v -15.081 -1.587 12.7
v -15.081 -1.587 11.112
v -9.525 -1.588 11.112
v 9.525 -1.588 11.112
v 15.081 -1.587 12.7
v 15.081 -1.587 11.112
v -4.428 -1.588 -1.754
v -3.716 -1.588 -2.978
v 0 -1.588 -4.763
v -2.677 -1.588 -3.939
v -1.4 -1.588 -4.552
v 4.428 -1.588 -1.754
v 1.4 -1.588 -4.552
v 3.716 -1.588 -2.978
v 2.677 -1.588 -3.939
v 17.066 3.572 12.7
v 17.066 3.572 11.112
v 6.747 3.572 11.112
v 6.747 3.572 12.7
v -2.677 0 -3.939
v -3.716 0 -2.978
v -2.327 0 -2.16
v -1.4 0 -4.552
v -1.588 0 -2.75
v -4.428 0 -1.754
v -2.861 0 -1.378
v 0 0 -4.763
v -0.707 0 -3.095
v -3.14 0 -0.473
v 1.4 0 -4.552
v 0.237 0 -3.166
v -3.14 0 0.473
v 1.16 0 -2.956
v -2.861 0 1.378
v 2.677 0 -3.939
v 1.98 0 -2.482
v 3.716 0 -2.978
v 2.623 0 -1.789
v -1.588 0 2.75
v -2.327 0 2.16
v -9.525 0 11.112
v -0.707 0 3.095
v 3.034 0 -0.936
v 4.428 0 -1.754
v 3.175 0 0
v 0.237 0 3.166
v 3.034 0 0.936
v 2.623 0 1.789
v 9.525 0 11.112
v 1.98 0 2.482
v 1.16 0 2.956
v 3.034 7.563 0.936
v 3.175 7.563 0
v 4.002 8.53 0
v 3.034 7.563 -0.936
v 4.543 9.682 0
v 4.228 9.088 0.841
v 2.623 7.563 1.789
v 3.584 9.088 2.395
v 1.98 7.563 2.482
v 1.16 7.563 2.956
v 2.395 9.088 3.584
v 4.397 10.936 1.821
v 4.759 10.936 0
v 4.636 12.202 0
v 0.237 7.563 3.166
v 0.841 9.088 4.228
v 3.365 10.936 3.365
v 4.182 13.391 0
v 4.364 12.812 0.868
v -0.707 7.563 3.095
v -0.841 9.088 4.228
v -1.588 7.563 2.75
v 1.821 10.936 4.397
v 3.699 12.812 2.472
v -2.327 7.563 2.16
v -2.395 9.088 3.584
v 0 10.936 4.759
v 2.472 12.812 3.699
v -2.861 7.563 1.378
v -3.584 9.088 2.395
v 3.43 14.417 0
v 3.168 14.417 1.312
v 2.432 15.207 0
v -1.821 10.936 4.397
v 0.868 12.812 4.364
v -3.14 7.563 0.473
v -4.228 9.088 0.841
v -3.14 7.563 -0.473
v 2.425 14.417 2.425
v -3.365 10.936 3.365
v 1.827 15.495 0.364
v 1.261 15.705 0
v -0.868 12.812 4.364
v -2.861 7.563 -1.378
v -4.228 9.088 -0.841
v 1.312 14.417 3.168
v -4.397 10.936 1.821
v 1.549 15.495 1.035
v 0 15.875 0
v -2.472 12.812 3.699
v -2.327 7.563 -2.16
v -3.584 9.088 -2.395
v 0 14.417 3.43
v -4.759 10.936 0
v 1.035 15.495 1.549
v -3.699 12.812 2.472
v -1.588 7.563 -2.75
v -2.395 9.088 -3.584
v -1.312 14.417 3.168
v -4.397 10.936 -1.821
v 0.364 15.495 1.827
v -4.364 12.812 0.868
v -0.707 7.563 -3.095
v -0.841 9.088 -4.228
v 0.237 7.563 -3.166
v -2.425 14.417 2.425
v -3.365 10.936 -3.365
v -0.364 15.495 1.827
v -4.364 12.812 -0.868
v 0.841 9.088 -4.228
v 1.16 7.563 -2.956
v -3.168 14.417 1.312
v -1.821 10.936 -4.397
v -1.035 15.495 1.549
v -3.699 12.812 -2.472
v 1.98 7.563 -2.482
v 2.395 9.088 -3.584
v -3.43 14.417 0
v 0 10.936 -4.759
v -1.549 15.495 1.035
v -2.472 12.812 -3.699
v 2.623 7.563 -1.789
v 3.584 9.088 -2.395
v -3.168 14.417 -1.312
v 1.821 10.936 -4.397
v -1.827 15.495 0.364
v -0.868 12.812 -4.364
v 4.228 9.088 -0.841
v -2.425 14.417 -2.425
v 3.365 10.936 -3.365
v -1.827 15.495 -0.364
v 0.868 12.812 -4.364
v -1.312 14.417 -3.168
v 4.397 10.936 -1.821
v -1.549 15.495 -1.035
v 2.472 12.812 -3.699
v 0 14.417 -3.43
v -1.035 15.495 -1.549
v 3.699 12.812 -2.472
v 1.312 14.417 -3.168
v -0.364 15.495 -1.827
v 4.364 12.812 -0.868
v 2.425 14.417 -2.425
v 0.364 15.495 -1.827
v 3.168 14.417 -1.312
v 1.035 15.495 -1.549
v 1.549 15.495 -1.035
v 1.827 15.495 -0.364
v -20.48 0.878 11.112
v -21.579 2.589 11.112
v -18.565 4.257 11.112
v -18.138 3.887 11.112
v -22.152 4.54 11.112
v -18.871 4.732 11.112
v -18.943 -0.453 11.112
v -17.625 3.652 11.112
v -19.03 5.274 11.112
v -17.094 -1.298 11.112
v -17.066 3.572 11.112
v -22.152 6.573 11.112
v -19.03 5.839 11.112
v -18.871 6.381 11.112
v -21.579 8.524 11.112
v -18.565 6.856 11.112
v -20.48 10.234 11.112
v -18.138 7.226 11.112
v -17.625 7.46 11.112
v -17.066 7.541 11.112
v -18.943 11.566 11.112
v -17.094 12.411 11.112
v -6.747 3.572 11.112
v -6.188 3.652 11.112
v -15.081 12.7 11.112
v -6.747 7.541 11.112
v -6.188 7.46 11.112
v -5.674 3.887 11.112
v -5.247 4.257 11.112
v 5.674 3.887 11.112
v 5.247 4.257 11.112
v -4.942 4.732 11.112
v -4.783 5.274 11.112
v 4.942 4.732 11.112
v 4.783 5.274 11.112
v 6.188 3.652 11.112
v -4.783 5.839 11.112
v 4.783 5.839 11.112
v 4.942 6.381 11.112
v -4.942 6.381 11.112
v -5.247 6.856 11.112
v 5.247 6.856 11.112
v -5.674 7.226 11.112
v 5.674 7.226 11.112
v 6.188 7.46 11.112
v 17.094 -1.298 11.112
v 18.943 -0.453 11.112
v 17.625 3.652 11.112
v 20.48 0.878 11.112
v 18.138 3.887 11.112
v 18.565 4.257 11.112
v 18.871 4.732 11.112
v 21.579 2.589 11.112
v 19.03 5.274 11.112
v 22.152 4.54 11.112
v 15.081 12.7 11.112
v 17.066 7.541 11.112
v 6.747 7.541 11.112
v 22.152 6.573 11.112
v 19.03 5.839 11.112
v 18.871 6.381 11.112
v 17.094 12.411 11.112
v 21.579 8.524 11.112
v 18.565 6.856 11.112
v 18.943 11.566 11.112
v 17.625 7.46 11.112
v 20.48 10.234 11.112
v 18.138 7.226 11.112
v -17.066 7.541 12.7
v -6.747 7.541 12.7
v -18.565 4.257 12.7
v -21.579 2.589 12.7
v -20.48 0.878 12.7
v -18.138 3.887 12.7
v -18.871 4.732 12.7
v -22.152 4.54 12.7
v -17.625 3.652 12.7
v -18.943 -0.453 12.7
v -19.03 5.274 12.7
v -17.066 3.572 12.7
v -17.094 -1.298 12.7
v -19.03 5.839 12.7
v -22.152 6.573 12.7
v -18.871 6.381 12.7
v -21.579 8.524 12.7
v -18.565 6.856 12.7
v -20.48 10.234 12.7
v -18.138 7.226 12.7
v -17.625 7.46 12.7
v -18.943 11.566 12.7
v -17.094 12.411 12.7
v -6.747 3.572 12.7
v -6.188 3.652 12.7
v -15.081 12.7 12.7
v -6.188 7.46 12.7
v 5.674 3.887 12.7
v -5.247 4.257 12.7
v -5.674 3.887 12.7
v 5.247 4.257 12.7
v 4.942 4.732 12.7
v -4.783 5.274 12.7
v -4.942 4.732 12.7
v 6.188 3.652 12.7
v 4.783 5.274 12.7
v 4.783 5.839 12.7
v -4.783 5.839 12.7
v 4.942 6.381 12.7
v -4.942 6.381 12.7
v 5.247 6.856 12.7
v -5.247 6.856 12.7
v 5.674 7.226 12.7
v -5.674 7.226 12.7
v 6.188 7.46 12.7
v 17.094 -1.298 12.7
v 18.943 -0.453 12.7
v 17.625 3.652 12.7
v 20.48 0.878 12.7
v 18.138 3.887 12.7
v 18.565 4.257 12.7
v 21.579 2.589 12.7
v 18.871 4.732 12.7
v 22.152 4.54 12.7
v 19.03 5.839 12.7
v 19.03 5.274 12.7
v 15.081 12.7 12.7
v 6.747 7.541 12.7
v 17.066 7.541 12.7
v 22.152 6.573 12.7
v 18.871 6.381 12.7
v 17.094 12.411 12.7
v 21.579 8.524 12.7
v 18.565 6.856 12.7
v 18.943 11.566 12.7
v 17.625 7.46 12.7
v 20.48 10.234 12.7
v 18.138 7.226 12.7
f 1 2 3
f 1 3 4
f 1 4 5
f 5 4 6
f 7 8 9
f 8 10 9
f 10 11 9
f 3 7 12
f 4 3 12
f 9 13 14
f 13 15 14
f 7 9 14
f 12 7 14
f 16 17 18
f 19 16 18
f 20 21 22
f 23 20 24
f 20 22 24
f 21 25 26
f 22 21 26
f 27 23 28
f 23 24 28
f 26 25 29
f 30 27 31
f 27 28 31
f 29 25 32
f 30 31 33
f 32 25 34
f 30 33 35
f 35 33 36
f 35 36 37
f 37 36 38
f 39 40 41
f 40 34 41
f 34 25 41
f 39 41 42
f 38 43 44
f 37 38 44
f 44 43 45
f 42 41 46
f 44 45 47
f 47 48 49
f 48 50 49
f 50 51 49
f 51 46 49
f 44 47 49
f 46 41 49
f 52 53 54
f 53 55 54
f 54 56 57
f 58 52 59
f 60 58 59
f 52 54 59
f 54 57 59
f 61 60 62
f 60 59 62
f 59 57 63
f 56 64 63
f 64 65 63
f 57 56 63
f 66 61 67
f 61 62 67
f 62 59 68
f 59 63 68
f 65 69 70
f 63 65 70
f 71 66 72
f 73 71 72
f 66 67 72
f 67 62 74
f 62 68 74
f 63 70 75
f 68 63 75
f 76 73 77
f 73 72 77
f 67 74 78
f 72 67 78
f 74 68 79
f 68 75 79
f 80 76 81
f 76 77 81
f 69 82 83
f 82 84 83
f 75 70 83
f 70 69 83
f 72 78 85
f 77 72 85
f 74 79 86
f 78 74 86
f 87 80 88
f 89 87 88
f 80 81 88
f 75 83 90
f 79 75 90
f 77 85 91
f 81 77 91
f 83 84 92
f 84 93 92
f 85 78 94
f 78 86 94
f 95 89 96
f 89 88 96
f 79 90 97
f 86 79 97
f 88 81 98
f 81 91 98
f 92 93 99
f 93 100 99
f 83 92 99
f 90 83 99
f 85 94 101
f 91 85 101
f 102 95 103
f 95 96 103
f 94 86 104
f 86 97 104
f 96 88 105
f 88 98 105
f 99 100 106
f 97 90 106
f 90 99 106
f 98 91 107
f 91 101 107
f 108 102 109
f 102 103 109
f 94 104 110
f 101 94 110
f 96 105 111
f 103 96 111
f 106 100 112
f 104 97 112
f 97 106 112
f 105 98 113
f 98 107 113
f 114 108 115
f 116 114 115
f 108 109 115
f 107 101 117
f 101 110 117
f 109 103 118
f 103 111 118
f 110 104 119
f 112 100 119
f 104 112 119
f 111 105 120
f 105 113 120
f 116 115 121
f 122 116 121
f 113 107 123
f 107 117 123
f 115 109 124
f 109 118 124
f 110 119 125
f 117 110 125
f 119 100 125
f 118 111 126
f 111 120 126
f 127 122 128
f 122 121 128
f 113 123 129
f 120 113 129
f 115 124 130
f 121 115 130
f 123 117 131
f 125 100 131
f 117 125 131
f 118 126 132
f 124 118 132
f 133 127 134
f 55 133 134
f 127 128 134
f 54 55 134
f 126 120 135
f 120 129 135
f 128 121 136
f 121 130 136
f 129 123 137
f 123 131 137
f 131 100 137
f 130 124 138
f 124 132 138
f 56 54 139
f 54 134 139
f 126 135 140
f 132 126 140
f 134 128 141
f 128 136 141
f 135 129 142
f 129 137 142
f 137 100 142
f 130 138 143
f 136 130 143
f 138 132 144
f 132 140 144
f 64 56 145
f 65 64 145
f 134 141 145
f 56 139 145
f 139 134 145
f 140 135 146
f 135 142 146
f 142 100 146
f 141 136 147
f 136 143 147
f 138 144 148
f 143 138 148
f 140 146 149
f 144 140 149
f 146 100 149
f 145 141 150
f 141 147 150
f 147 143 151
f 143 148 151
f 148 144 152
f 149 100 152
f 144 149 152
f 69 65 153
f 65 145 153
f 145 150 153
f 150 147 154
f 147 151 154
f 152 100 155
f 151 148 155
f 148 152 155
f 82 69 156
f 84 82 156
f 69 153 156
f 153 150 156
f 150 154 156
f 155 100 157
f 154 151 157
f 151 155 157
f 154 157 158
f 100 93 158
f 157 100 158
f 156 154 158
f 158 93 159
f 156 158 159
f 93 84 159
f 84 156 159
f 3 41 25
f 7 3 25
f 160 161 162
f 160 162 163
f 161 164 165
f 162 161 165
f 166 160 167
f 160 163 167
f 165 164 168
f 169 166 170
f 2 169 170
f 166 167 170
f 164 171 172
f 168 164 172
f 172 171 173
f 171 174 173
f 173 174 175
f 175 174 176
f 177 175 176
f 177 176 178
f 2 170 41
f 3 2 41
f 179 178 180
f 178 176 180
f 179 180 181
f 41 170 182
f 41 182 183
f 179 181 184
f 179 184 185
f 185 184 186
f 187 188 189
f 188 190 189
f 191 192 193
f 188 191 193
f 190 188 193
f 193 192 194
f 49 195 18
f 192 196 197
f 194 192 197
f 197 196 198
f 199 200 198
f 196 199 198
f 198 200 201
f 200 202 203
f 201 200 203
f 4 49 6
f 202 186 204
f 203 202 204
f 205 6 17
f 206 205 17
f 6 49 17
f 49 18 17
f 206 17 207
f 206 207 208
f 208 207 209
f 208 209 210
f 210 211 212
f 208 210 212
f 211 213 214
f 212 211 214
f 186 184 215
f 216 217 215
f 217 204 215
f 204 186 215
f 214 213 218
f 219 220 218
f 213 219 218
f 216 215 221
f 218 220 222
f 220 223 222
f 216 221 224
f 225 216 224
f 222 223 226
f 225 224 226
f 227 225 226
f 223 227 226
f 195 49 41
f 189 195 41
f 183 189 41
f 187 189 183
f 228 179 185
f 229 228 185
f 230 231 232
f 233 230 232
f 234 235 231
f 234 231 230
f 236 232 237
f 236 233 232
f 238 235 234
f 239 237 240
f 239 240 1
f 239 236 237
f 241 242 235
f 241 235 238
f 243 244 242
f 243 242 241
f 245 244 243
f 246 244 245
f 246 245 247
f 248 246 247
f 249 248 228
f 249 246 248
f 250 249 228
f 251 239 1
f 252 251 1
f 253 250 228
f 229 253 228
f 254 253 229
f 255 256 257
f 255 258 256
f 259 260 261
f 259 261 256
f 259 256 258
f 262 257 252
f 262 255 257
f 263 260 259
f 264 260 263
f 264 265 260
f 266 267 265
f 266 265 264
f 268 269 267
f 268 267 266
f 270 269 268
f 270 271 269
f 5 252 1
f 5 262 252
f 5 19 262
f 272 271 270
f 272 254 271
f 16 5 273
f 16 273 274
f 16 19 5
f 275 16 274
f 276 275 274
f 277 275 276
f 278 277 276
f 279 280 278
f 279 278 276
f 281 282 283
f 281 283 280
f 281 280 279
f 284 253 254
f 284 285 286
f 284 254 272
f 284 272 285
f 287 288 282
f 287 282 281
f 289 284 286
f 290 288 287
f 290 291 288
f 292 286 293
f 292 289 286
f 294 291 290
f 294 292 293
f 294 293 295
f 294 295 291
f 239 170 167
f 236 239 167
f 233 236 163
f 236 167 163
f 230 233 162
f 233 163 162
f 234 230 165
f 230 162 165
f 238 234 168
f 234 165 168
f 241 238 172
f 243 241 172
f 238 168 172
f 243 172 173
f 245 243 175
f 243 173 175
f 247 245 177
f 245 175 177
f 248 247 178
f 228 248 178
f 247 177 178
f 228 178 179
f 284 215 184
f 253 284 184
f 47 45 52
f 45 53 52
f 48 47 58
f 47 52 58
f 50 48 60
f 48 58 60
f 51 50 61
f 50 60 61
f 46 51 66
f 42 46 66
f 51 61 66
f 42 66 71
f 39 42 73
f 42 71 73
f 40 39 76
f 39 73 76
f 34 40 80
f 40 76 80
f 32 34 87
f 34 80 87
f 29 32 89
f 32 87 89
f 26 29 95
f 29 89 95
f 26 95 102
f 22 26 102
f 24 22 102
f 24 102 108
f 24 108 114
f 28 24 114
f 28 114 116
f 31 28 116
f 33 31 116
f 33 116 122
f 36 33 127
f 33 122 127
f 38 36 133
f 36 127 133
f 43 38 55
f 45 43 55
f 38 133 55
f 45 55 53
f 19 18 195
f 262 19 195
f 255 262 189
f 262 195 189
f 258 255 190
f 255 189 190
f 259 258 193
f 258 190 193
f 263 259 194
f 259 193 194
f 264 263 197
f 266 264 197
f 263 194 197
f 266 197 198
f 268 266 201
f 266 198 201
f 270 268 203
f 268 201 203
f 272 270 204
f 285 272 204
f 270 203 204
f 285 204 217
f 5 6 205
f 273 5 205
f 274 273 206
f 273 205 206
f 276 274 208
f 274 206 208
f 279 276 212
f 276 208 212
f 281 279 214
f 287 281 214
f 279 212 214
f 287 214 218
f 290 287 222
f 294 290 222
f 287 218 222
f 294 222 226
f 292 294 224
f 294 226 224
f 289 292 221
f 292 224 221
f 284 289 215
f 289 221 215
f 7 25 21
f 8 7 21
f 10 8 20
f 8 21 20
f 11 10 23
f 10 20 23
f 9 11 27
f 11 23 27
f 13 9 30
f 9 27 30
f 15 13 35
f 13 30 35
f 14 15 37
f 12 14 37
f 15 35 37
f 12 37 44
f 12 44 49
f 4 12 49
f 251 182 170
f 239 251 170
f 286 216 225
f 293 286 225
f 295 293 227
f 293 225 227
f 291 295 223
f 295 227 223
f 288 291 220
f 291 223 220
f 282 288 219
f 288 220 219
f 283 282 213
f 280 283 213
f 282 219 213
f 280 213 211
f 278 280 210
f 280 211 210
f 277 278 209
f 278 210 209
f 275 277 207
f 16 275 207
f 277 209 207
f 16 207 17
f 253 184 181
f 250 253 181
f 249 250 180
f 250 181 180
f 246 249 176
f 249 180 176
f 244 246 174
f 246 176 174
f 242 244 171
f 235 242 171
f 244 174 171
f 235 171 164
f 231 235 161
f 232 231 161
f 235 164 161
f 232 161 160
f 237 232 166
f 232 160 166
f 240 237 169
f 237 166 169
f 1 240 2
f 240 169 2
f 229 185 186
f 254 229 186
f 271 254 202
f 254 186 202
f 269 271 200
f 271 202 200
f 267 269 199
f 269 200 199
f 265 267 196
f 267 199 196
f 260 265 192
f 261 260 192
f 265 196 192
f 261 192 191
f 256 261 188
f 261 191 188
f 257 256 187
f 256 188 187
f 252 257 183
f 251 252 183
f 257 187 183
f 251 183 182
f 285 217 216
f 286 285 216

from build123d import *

# Parameters (mm, degrees)
F1_DEPTH = 1.5875
F4_W     = 19.05
F4_H     = 1.5875
F5_DEPTH = 1.5875


with BuildPart() as f1:
    # F0 (on Front) → F1 (new body)
    with BuildSketch(Plane.XZ):
        with BuildLine():
            ThreePointArc((4.4277010242, -1.7541008779), (4.6780515377, -0.8928830052), (4.7625, 0))
            ThreePointArc((4.7625, 0), (-0.8928830052, 4.6780515377), (-4.4277010242, -1.7541008779))
            ThreePointArc((-4.4277010242, -1.7541008779), (0, -4.7625), (4.4277010242, -1.7541008779))
        make_face()
        with BuildLine():
            ThreePointArc((-4.4277010242, -1.7541008779), (-0.8928830052, 4.6780515377), (4.7625, 0))
            ThreePointArc((4.7625, 0), (4.6780515377, -0.8928830052), (4.4277010242, -1.7541008779))
            Line((4.4277010242, -1.7541008779), (9.525, 11.1125))
            Line((9.525, 11.1125), (-9.525, 11.1125))
            Line((-9.525, 11.1125), (-4.4277010242, -1.7541008779))
        make_face()
    extrude(amount=F1_DEPTH)

    # F2 (on Top) → F3 (revolve)
    with BuildSketch(Plane.XY):
        with BuildLine():
            Line((0, 0), (3.175, 0))
            Line((3.175, 0), (3.175, 7.5627420857))
            ThreePointArc((3.175, 7.5627420857), (1.6993652025, 6.6635041404), (0, 6.35))
            Line((0, 6.35), (0, 0))
        make_face()
        with BuildLine():
            ThreePointArc((0, 6.35), (1.6993652025, 6.6635041404), (3.175, 7.5627420857))
            ThreePointArc((3.175, 7.5627420857), (4.4489958596, 12.8118652025), (0, 15.875))
            Line((0, 15.875), (0, 11.1125))
            Line((0, 11.1125), (0, 6.35))
        make_face()
    revolve(axis=Axis((0, 5.55625, 0), (0, -1, 0)))

    # F4 (on face) → F5 (join)
    with BuildSketch(Plane.XY.offset(11.1125)):
        with BuildLine():
            Line((9.525, -1.5875), (15.08125, -1.5875))
            ThreePointArc((15.08125, -1.5875), (22.225, 5.55625), (15.08125, 12.7))
            Line((15.08125, 12.7), (-15.08125, 12.7))
            ThreePointArc((-15.08125, 12.7), (-22.225, 5.55625), (-15.08125, -1.5875))
            Line((-15.08125, -1.5875), (-9.525, -1.5875))
            Line((-9.525, -1.5875), (-9.525, 0))
            Line((-9.525, 0), (9.525, 0))
            Line((9.525, 0), (9.525, -1.5875))
        make_face()
        with BuildLine():
            ThreePointArc((-17.065625, 3.571875), (-19.05, 5.55625), (-17.065625, 7.540625))
            Line((-17.065625, 7.540625), (-6.746875, 7.540625))
            ThreePointArc((-6.746875, 7.540625), (-4.7625, 5.55625), (-6.746875, 3.571875))
            Line((-6.746875, 3.571875), (-17.065625, 3.571875))
        make_face(mode=Mode.SUBTRACT)
        with BuildLine():
            ThreePointArc((17.065625, 7.540625), (19.05, 5.55625), (17.065625, 3.571875))
            Line((17.065625, 3.571875), (6.746875, 3.571875))
            ThreePointArc((6.746875, 3.571875), (4.7625, 5.55625), (6.746875, 7.540625))
            Line((6.746875, 7.540625), (17.065625, 7.540625))
        make_face(mode=Mode.SUBTRACT)
        with Locations((0, -0.79375)):
            Rectangle(F4_W, F4_H)
    extrude(amount=F5_DEPTH)


solid = f1.part
